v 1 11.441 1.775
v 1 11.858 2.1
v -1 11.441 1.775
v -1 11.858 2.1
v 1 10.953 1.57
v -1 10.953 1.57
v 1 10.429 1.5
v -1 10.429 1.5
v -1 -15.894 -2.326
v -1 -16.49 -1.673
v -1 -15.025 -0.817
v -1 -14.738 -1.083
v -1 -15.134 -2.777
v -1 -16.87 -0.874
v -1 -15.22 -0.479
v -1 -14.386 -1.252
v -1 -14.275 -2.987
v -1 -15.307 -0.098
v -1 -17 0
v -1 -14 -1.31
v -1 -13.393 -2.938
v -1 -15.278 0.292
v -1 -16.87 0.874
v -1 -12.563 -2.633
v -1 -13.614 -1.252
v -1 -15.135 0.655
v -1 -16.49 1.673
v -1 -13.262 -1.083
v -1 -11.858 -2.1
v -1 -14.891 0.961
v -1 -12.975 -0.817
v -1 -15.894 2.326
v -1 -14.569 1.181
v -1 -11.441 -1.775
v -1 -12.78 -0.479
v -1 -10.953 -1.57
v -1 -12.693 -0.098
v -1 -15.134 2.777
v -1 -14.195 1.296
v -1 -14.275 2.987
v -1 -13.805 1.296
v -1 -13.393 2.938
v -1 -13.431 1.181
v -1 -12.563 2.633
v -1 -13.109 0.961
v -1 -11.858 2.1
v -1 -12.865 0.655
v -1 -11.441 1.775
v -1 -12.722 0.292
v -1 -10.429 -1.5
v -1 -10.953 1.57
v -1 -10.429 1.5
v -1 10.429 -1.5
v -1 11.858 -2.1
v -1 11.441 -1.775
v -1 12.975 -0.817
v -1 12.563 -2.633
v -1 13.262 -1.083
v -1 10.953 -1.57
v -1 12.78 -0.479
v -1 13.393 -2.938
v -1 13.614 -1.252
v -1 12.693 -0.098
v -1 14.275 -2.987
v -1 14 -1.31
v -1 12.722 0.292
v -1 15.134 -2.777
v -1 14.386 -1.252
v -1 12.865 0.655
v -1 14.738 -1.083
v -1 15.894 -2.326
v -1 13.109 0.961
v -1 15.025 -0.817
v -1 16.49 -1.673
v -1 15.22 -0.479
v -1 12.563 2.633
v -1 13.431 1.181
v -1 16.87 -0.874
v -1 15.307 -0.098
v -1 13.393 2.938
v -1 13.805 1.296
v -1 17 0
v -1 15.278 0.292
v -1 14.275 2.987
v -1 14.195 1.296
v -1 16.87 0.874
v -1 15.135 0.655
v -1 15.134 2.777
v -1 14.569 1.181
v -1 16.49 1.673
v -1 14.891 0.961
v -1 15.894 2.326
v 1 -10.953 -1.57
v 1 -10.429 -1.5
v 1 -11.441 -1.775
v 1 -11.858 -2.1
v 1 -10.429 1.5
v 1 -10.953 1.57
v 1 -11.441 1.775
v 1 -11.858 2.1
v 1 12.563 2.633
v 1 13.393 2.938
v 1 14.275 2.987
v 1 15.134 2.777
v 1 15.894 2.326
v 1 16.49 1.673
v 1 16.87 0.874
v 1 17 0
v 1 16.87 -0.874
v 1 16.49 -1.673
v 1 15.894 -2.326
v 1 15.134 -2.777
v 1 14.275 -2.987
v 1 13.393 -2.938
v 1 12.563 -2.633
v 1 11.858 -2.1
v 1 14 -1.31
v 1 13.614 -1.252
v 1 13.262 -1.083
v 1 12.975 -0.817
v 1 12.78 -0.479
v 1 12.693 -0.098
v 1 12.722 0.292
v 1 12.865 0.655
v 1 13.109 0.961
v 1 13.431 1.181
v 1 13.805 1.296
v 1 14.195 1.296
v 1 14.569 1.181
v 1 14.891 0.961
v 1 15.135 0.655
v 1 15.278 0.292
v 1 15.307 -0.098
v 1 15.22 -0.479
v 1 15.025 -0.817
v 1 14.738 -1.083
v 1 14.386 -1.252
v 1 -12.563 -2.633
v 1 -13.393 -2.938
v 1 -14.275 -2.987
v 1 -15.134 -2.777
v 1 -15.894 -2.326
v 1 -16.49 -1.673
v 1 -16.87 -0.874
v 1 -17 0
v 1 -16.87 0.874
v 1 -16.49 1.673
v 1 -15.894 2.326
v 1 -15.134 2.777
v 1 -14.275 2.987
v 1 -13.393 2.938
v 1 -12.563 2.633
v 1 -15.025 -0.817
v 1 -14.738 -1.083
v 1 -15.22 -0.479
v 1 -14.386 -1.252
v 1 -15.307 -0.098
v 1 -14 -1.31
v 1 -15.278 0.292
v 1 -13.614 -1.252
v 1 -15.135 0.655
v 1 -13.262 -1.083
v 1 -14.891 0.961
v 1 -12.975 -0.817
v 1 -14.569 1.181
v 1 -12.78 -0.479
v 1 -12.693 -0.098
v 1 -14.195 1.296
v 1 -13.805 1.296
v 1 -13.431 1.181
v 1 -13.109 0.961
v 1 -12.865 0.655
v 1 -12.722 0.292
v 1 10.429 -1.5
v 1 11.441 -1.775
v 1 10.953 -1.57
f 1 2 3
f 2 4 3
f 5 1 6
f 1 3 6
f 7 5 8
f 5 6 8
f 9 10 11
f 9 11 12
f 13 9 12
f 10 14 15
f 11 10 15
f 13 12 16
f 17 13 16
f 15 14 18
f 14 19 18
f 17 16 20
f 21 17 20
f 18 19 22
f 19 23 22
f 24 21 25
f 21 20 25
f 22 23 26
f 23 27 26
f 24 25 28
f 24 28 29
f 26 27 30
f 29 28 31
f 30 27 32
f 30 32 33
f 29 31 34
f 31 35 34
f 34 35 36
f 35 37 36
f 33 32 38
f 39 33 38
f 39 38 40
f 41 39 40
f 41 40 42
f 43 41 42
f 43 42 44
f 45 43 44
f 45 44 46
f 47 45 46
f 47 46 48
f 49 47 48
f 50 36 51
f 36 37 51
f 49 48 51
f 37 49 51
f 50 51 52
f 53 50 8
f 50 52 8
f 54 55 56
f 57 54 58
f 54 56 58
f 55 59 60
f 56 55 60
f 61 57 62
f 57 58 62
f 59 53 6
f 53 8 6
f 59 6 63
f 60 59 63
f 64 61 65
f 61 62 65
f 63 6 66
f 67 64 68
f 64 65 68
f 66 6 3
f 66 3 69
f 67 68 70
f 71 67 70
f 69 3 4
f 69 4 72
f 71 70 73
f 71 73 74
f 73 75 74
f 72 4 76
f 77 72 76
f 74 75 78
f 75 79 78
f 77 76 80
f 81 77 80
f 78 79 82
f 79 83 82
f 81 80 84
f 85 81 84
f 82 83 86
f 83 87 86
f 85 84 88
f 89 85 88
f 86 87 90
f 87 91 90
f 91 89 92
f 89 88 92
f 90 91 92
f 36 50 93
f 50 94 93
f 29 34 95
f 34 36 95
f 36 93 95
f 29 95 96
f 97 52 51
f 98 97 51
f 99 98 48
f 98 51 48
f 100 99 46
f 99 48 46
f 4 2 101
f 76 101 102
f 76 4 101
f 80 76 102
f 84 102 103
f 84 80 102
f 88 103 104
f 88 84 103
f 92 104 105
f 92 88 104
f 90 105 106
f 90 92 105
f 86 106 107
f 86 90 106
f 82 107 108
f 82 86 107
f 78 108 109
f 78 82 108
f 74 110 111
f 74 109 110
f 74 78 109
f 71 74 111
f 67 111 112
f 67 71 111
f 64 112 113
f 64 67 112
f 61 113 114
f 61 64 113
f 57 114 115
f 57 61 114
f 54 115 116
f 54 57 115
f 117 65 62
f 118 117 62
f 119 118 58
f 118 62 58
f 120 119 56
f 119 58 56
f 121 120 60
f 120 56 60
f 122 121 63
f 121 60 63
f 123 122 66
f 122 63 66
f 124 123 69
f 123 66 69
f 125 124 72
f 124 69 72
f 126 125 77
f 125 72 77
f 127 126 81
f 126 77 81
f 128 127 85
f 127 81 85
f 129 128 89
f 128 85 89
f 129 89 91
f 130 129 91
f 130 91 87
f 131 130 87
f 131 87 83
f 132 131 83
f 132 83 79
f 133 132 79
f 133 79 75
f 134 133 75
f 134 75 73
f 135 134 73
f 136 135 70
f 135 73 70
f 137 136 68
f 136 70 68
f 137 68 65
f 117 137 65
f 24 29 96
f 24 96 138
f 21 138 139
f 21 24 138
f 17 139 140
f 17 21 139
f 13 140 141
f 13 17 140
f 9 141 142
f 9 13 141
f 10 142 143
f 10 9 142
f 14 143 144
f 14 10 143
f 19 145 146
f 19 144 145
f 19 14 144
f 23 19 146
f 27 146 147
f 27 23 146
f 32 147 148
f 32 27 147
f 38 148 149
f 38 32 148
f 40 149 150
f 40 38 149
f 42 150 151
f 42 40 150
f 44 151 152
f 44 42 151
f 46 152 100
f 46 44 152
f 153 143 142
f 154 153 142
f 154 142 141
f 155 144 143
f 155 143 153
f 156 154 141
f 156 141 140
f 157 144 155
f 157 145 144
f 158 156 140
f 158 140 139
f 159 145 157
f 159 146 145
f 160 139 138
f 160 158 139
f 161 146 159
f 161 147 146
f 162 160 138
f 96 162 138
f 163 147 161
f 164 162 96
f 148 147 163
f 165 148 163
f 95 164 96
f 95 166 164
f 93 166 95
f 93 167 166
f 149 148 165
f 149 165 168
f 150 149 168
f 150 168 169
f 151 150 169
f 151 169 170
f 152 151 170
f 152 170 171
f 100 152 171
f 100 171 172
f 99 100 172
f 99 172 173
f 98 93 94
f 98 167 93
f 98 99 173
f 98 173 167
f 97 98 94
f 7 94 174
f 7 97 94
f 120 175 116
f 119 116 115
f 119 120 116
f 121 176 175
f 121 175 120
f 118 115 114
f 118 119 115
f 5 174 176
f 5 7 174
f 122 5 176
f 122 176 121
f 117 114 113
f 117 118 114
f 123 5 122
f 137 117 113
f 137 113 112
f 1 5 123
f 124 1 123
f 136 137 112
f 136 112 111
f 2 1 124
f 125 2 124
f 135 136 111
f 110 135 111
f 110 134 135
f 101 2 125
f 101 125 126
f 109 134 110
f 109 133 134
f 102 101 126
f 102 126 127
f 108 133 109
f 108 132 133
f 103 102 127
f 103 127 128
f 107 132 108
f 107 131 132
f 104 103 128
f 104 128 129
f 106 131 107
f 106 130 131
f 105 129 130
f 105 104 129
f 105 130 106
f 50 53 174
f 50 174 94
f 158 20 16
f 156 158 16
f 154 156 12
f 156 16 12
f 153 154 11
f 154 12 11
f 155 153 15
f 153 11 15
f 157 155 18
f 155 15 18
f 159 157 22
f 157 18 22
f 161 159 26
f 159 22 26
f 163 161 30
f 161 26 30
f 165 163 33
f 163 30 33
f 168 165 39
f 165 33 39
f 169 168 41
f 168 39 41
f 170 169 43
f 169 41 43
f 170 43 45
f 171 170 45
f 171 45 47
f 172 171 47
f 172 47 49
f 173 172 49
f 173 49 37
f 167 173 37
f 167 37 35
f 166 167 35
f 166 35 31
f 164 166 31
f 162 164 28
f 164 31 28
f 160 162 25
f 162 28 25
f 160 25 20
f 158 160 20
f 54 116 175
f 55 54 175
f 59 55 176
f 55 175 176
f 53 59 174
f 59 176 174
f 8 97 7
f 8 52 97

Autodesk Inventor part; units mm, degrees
ref_plane "YZ Plane" through (0, 0, 0) normal (1, 0, 0) x (0, 1, 0)
ref_plane "XZ Plane" through (0, 0, 0) normal (0, 1, 0) x (-1, 0, 0)
ref_plane "XY Plane" through (0, 0, 0) normal (0, 0, 1) x (1, 0, 0)
sketch "Sketch1" plane through (0, 0, 0) normal (1, 0, 0) x (0, 1, 0)
  line L0 (-14, 0) -> (14, 0) construction
  circle A0 centre (-14, 0) radius 3
  circle A1 centre (14, 0) radius 3
  line L1 (-11.4019, 1.5) -> (11.4019, 1.5)
  line L2 (11.4019, -1.5) -> (-11.4019, -1.5)
  point P0 (0, 0)
  point P1 (0, 0)
  dimension "d0" = 28
  dimension "d1" = 6
  dimension "d2" = 3
extrude "Extrusion1" add sketch "Sketch1" along normal mid plane 2
fillet "Fillet1" radius 2 4 edges at (0, -11.4019, 1.5) (0, -11.4019, -1.5) (0, 11.4019, -1.5) (0, 11.4019, 1.5)
sketch "Sketch2" plane through (1, 0, 0) normal (1, 0, 0) x (0, 0, -1)
  arc A0 (-2.1, -11.8576) -> (2.1, -11.8576) centre (0, -14) ccw projected
  arc A1 (1.5, -10.4293) -> (2.1, -11.8576) centre (3.5, -10.4293) ccw projected
  line L0 (1.5, -10.4293) -> (1.5, 10.4293) projected
  arc A2 (2.1, 11.8576) -> (1.5, 10.4293) centre (3.5, 10.4293) ccw projected
  arc A3 (2.1, 11.8576) -> (-2.1, 11.8576) centre (0, 14) ccw projected
  arc A4 (-1.5, 10.4293) -> (-2.1, 11.8576) centre (-3.5, 10.4293) ccw projected
  line L1 (-1.5, 10.4293) -> (-1.5, -10.4293) projected
  arc A5 (-2.1, -11.8576) -> (-1.5, -10.4293) centre (-3.5, -10.4293) ccw projected
  point P0 (0, 0)
hole "Hole1" at (1, -14, 0) at (1, 14, 0) direction (-1, 0, 0) diameter 2.621 end through all thread size "M3x0.35" class "6H" standard "ANSI Metric M Profile"
properties part number "Backplane_Nut" material "Aluminum 6061"
